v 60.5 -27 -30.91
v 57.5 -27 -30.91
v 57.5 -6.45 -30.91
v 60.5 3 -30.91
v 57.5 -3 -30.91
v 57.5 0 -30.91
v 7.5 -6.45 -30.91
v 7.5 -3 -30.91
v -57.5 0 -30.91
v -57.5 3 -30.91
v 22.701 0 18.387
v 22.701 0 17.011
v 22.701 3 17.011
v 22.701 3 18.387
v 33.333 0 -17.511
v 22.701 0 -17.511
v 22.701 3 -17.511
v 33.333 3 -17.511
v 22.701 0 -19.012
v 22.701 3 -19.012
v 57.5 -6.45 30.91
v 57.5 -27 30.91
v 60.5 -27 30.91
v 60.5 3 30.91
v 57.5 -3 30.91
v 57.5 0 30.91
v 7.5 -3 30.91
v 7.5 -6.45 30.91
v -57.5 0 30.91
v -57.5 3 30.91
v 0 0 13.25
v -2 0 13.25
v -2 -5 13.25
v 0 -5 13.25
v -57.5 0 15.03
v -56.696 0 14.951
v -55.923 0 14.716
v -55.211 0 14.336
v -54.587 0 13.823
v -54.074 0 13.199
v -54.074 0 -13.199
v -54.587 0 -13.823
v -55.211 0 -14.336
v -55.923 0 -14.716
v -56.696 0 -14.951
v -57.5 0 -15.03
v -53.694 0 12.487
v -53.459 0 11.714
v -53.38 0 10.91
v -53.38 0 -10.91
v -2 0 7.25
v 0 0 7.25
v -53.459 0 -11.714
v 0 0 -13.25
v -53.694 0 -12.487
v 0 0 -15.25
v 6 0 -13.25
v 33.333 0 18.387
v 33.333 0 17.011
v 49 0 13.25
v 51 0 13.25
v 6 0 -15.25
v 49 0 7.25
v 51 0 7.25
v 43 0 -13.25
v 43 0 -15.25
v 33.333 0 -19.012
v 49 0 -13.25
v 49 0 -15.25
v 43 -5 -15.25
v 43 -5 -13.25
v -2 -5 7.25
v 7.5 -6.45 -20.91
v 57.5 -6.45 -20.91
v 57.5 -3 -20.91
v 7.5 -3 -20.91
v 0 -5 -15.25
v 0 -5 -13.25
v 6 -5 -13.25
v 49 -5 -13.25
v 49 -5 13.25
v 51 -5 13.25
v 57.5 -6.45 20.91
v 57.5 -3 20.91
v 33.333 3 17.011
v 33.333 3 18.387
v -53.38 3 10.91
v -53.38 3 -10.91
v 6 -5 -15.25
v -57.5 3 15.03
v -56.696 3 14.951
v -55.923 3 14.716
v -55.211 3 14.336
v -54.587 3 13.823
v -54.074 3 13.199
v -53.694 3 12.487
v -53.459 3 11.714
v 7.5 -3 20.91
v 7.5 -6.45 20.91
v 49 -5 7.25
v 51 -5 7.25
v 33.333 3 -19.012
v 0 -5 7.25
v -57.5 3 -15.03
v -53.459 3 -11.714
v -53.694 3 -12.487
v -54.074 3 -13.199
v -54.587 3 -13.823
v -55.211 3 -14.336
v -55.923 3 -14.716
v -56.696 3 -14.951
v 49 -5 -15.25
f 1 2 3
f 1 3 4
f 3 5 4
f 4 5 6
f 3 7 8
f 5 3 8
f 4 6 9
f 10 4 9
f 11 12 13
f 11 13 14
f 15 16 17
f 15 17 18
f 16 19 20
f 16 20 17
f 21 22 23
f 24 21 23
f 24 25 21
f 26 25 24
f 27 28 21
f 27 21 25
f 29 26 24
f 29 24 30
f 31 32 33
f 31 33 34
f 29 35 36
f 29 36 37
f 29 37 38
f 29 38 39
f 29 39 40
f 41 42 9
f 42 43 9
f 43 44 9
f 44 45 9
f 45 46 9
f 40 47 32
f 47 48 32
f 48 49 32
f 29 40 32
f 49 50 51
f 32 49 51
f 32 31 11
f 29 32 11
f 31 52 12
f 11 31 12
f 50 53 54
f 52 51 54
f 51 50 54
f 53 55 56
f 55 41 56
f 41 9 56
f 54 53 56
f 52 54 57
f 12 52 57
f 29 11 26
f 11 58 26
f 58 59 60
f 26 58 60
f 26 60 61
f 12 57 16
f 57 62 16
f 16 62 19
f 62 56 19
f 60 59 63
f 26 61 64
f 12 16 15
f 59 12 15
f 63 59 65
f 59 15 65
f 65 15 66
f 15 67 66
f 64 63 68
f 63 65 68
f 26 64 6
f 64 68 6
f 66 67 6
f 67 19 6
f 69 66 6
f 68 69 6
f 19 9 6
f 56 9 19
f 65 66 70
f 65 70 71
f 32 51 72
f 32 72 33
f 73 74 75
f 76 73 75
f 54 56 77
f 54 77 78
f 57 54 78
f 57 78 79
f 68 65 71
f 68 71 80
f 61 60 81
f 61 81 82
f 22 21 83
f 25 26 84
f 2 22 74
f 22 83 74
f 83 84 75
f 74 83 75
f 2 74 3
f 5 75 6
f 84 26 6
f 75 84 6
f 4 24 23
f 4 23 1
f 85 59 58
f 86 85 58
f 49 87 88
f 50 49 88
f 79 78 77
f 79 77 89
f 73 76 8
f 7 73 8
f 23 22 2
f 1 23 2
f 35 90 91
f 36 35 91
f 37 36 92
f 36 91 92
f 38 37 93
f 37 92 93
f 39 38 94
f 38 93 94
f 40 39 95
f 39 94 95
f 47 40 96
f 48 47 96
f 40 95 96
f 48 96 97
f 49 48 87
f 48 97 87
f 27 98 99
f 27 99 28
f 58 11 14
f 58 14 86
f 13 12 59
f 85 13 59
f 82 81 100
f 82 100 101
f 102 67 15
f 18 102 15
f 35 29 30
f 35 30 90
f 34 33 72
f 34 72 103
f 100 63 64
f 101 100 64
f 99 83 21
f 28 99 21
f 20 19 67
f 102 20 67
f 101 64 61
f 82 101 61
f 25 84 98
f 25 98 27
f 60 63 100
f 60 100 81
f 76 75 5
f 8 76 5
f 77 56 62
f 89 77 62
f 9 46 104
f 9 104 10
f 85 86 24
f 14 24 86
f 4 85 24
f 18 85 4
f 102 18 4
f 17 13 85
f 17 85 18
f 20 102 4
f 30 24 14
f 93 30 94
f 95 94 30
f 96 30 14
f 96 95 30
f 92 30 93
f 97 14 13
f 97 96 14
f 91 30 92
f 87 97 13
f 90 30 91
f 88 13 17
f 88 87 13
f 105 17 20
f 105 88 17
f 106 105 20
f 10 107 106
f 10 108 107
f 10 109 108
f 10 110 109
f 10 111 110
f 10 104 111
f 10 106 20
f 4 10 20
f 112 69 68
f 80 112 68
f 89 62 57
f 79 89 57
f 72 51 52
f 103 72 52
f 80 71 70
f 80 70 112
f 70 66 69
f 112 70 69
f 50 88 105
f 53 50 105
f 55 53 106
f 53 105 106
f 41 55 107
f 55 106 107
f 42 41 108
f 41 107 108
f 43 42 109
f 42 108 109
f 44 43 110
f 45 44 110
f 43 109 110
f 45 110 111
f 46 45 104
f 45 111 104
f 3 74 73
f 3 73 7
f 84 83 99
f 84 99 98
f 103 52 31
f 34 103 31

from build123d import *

# Parameters (mm, degrees)
SKETCH1_W            = 115
SKETCH1_H            = 61.82
BOSS_EXTRUDE1_DEPTH  = 3
CUT_EXTRUDE1_DEPTH   = 3
SKETCH3_W            = 61.82
SKETCH3_H            = 30
BOSS_EXTRUDE2_DEPTH  = 3
SKETCH4_W            = 10
SKETCH4_H            = 3.45
BOSS_EXTRUDE3_DEPTH  = 50
SKETCH5_W            = 6
SKETCH5_H            = 2
SKETCH5_W_2          = 2
SKETCH5_H_2          = 6
BOSS_EXTRUDE12_DEPTH = 5
SKETCH8_W            = 10.631694969
SKETCH8_H            = 1.375866407
SKETCH8_H_2          = 1.500945172
CUT_EXTRUDE2_DEPTH   = 5


with BuildPart() as part:
    # Sketch1 → Boss-Extrude1 (new body)
    with BuildSketch(Plane(origin=(0, 0, 0), x_dir=(1, 0, 0), z_dir=(0, 1, 0))):
        Rectangle(SKETCH1_W, SKETCH1_H)
    extrude(amount=BOSS_EXTRUDE1_DEPTH)

    # Sketch2 → Cut-Extrude1 (cut)
    with BuildSketch(Plane(origin=(0, 3, 0), x_dir=(1, 0, 0), z_dir=(0, 1, 0))):
        with BuildLine():
            Line((-57.5, -10.91), (-57.5, -15.029841252))
            ThreePointArc((-57.5, -15.029841252), (-54.586832313, -13.823167687), (-53.380158748, -10.91))
            Line((-53.380158748, -10.91), (-53.380158748, 10.91))
            ThreePointArc((-53.380158748, 10.91), (-54.586832313, 13.823167687), (-57.5, 15.029841252))
            Line((-57.5, 15.029841252), (-57.5, 10.91))
            Line((-57.5, 10.91), (-57.5, -10.91))
        make_face()
    extrude(amount=-CUT_EXTRUDE1_DEPTH, mode=Mode.SUBTRACT)

    # Sketch3 → Boss-Extrude2 (add)
    with BuildSketch(Plane(origin=(57.5, 0, 0), x_dir=(0, 0, -1), z_dir=(1, 0, 0))):
        with Locations((0, -12)):
            Rectangle(SKETCH3_W, SKETCH3_H)
    extrude(amount=BOSS_EXTRUDE2_DEPTH)

    # Sketch4 → Boss-Extrude3 (add)
    with BuildSketch(Plane.ZY.offset(-57.5)):
        with Locations((25.91, -4.725)):
            Rectangle(SKETCH4_W, SKETCH4_H)
    boss_extrude3 = extrude(amount=BOSS_EXTRUDE3_DEPTH)

    # Mirror1: Boss-Extrude3 across plane
    add(boss_extrude3.mirror(Plane.XY))

    # Sketch5 → Boss-Extrude12 (add)
    with BuildSketch(Plane.XZ):
        with Locations((46, -14.25)):
            Rectangle(SKETCH5_W, SKETCH5_H)
        with Locations((3, -14.25)):
            Rectangle(SKETCH5_W, SKETCH5_H)
        with Locations((-1, 10.25)):
            Rectangle(SKETCH5_W_2, SKETCH5_H_2)
        with Locations((50, 10.25)):
            Rectangle(SKETCH5_W_2, SKETCH5_H_2)
    extrude(amount=BOSS_EXTRUDE12_DEPTH)

    # Sketch8 → Cut-Extrude2 (cut)
    with BuildSketch(Plane.XZ):
        with Locations((28.01669804, 17.698645154)):
            Rectangle(SKETCH8_W, SKETCH8_H)
        with Locations((28.01669804, -18.261499593)):
            Rectangle(SKETCH8_W, SKETCH8_H_2)
    extrude(amount=-CUT_EXTRUDE2_DEPTH, mode=Mode.SUBTRACT)


solid = part.part
